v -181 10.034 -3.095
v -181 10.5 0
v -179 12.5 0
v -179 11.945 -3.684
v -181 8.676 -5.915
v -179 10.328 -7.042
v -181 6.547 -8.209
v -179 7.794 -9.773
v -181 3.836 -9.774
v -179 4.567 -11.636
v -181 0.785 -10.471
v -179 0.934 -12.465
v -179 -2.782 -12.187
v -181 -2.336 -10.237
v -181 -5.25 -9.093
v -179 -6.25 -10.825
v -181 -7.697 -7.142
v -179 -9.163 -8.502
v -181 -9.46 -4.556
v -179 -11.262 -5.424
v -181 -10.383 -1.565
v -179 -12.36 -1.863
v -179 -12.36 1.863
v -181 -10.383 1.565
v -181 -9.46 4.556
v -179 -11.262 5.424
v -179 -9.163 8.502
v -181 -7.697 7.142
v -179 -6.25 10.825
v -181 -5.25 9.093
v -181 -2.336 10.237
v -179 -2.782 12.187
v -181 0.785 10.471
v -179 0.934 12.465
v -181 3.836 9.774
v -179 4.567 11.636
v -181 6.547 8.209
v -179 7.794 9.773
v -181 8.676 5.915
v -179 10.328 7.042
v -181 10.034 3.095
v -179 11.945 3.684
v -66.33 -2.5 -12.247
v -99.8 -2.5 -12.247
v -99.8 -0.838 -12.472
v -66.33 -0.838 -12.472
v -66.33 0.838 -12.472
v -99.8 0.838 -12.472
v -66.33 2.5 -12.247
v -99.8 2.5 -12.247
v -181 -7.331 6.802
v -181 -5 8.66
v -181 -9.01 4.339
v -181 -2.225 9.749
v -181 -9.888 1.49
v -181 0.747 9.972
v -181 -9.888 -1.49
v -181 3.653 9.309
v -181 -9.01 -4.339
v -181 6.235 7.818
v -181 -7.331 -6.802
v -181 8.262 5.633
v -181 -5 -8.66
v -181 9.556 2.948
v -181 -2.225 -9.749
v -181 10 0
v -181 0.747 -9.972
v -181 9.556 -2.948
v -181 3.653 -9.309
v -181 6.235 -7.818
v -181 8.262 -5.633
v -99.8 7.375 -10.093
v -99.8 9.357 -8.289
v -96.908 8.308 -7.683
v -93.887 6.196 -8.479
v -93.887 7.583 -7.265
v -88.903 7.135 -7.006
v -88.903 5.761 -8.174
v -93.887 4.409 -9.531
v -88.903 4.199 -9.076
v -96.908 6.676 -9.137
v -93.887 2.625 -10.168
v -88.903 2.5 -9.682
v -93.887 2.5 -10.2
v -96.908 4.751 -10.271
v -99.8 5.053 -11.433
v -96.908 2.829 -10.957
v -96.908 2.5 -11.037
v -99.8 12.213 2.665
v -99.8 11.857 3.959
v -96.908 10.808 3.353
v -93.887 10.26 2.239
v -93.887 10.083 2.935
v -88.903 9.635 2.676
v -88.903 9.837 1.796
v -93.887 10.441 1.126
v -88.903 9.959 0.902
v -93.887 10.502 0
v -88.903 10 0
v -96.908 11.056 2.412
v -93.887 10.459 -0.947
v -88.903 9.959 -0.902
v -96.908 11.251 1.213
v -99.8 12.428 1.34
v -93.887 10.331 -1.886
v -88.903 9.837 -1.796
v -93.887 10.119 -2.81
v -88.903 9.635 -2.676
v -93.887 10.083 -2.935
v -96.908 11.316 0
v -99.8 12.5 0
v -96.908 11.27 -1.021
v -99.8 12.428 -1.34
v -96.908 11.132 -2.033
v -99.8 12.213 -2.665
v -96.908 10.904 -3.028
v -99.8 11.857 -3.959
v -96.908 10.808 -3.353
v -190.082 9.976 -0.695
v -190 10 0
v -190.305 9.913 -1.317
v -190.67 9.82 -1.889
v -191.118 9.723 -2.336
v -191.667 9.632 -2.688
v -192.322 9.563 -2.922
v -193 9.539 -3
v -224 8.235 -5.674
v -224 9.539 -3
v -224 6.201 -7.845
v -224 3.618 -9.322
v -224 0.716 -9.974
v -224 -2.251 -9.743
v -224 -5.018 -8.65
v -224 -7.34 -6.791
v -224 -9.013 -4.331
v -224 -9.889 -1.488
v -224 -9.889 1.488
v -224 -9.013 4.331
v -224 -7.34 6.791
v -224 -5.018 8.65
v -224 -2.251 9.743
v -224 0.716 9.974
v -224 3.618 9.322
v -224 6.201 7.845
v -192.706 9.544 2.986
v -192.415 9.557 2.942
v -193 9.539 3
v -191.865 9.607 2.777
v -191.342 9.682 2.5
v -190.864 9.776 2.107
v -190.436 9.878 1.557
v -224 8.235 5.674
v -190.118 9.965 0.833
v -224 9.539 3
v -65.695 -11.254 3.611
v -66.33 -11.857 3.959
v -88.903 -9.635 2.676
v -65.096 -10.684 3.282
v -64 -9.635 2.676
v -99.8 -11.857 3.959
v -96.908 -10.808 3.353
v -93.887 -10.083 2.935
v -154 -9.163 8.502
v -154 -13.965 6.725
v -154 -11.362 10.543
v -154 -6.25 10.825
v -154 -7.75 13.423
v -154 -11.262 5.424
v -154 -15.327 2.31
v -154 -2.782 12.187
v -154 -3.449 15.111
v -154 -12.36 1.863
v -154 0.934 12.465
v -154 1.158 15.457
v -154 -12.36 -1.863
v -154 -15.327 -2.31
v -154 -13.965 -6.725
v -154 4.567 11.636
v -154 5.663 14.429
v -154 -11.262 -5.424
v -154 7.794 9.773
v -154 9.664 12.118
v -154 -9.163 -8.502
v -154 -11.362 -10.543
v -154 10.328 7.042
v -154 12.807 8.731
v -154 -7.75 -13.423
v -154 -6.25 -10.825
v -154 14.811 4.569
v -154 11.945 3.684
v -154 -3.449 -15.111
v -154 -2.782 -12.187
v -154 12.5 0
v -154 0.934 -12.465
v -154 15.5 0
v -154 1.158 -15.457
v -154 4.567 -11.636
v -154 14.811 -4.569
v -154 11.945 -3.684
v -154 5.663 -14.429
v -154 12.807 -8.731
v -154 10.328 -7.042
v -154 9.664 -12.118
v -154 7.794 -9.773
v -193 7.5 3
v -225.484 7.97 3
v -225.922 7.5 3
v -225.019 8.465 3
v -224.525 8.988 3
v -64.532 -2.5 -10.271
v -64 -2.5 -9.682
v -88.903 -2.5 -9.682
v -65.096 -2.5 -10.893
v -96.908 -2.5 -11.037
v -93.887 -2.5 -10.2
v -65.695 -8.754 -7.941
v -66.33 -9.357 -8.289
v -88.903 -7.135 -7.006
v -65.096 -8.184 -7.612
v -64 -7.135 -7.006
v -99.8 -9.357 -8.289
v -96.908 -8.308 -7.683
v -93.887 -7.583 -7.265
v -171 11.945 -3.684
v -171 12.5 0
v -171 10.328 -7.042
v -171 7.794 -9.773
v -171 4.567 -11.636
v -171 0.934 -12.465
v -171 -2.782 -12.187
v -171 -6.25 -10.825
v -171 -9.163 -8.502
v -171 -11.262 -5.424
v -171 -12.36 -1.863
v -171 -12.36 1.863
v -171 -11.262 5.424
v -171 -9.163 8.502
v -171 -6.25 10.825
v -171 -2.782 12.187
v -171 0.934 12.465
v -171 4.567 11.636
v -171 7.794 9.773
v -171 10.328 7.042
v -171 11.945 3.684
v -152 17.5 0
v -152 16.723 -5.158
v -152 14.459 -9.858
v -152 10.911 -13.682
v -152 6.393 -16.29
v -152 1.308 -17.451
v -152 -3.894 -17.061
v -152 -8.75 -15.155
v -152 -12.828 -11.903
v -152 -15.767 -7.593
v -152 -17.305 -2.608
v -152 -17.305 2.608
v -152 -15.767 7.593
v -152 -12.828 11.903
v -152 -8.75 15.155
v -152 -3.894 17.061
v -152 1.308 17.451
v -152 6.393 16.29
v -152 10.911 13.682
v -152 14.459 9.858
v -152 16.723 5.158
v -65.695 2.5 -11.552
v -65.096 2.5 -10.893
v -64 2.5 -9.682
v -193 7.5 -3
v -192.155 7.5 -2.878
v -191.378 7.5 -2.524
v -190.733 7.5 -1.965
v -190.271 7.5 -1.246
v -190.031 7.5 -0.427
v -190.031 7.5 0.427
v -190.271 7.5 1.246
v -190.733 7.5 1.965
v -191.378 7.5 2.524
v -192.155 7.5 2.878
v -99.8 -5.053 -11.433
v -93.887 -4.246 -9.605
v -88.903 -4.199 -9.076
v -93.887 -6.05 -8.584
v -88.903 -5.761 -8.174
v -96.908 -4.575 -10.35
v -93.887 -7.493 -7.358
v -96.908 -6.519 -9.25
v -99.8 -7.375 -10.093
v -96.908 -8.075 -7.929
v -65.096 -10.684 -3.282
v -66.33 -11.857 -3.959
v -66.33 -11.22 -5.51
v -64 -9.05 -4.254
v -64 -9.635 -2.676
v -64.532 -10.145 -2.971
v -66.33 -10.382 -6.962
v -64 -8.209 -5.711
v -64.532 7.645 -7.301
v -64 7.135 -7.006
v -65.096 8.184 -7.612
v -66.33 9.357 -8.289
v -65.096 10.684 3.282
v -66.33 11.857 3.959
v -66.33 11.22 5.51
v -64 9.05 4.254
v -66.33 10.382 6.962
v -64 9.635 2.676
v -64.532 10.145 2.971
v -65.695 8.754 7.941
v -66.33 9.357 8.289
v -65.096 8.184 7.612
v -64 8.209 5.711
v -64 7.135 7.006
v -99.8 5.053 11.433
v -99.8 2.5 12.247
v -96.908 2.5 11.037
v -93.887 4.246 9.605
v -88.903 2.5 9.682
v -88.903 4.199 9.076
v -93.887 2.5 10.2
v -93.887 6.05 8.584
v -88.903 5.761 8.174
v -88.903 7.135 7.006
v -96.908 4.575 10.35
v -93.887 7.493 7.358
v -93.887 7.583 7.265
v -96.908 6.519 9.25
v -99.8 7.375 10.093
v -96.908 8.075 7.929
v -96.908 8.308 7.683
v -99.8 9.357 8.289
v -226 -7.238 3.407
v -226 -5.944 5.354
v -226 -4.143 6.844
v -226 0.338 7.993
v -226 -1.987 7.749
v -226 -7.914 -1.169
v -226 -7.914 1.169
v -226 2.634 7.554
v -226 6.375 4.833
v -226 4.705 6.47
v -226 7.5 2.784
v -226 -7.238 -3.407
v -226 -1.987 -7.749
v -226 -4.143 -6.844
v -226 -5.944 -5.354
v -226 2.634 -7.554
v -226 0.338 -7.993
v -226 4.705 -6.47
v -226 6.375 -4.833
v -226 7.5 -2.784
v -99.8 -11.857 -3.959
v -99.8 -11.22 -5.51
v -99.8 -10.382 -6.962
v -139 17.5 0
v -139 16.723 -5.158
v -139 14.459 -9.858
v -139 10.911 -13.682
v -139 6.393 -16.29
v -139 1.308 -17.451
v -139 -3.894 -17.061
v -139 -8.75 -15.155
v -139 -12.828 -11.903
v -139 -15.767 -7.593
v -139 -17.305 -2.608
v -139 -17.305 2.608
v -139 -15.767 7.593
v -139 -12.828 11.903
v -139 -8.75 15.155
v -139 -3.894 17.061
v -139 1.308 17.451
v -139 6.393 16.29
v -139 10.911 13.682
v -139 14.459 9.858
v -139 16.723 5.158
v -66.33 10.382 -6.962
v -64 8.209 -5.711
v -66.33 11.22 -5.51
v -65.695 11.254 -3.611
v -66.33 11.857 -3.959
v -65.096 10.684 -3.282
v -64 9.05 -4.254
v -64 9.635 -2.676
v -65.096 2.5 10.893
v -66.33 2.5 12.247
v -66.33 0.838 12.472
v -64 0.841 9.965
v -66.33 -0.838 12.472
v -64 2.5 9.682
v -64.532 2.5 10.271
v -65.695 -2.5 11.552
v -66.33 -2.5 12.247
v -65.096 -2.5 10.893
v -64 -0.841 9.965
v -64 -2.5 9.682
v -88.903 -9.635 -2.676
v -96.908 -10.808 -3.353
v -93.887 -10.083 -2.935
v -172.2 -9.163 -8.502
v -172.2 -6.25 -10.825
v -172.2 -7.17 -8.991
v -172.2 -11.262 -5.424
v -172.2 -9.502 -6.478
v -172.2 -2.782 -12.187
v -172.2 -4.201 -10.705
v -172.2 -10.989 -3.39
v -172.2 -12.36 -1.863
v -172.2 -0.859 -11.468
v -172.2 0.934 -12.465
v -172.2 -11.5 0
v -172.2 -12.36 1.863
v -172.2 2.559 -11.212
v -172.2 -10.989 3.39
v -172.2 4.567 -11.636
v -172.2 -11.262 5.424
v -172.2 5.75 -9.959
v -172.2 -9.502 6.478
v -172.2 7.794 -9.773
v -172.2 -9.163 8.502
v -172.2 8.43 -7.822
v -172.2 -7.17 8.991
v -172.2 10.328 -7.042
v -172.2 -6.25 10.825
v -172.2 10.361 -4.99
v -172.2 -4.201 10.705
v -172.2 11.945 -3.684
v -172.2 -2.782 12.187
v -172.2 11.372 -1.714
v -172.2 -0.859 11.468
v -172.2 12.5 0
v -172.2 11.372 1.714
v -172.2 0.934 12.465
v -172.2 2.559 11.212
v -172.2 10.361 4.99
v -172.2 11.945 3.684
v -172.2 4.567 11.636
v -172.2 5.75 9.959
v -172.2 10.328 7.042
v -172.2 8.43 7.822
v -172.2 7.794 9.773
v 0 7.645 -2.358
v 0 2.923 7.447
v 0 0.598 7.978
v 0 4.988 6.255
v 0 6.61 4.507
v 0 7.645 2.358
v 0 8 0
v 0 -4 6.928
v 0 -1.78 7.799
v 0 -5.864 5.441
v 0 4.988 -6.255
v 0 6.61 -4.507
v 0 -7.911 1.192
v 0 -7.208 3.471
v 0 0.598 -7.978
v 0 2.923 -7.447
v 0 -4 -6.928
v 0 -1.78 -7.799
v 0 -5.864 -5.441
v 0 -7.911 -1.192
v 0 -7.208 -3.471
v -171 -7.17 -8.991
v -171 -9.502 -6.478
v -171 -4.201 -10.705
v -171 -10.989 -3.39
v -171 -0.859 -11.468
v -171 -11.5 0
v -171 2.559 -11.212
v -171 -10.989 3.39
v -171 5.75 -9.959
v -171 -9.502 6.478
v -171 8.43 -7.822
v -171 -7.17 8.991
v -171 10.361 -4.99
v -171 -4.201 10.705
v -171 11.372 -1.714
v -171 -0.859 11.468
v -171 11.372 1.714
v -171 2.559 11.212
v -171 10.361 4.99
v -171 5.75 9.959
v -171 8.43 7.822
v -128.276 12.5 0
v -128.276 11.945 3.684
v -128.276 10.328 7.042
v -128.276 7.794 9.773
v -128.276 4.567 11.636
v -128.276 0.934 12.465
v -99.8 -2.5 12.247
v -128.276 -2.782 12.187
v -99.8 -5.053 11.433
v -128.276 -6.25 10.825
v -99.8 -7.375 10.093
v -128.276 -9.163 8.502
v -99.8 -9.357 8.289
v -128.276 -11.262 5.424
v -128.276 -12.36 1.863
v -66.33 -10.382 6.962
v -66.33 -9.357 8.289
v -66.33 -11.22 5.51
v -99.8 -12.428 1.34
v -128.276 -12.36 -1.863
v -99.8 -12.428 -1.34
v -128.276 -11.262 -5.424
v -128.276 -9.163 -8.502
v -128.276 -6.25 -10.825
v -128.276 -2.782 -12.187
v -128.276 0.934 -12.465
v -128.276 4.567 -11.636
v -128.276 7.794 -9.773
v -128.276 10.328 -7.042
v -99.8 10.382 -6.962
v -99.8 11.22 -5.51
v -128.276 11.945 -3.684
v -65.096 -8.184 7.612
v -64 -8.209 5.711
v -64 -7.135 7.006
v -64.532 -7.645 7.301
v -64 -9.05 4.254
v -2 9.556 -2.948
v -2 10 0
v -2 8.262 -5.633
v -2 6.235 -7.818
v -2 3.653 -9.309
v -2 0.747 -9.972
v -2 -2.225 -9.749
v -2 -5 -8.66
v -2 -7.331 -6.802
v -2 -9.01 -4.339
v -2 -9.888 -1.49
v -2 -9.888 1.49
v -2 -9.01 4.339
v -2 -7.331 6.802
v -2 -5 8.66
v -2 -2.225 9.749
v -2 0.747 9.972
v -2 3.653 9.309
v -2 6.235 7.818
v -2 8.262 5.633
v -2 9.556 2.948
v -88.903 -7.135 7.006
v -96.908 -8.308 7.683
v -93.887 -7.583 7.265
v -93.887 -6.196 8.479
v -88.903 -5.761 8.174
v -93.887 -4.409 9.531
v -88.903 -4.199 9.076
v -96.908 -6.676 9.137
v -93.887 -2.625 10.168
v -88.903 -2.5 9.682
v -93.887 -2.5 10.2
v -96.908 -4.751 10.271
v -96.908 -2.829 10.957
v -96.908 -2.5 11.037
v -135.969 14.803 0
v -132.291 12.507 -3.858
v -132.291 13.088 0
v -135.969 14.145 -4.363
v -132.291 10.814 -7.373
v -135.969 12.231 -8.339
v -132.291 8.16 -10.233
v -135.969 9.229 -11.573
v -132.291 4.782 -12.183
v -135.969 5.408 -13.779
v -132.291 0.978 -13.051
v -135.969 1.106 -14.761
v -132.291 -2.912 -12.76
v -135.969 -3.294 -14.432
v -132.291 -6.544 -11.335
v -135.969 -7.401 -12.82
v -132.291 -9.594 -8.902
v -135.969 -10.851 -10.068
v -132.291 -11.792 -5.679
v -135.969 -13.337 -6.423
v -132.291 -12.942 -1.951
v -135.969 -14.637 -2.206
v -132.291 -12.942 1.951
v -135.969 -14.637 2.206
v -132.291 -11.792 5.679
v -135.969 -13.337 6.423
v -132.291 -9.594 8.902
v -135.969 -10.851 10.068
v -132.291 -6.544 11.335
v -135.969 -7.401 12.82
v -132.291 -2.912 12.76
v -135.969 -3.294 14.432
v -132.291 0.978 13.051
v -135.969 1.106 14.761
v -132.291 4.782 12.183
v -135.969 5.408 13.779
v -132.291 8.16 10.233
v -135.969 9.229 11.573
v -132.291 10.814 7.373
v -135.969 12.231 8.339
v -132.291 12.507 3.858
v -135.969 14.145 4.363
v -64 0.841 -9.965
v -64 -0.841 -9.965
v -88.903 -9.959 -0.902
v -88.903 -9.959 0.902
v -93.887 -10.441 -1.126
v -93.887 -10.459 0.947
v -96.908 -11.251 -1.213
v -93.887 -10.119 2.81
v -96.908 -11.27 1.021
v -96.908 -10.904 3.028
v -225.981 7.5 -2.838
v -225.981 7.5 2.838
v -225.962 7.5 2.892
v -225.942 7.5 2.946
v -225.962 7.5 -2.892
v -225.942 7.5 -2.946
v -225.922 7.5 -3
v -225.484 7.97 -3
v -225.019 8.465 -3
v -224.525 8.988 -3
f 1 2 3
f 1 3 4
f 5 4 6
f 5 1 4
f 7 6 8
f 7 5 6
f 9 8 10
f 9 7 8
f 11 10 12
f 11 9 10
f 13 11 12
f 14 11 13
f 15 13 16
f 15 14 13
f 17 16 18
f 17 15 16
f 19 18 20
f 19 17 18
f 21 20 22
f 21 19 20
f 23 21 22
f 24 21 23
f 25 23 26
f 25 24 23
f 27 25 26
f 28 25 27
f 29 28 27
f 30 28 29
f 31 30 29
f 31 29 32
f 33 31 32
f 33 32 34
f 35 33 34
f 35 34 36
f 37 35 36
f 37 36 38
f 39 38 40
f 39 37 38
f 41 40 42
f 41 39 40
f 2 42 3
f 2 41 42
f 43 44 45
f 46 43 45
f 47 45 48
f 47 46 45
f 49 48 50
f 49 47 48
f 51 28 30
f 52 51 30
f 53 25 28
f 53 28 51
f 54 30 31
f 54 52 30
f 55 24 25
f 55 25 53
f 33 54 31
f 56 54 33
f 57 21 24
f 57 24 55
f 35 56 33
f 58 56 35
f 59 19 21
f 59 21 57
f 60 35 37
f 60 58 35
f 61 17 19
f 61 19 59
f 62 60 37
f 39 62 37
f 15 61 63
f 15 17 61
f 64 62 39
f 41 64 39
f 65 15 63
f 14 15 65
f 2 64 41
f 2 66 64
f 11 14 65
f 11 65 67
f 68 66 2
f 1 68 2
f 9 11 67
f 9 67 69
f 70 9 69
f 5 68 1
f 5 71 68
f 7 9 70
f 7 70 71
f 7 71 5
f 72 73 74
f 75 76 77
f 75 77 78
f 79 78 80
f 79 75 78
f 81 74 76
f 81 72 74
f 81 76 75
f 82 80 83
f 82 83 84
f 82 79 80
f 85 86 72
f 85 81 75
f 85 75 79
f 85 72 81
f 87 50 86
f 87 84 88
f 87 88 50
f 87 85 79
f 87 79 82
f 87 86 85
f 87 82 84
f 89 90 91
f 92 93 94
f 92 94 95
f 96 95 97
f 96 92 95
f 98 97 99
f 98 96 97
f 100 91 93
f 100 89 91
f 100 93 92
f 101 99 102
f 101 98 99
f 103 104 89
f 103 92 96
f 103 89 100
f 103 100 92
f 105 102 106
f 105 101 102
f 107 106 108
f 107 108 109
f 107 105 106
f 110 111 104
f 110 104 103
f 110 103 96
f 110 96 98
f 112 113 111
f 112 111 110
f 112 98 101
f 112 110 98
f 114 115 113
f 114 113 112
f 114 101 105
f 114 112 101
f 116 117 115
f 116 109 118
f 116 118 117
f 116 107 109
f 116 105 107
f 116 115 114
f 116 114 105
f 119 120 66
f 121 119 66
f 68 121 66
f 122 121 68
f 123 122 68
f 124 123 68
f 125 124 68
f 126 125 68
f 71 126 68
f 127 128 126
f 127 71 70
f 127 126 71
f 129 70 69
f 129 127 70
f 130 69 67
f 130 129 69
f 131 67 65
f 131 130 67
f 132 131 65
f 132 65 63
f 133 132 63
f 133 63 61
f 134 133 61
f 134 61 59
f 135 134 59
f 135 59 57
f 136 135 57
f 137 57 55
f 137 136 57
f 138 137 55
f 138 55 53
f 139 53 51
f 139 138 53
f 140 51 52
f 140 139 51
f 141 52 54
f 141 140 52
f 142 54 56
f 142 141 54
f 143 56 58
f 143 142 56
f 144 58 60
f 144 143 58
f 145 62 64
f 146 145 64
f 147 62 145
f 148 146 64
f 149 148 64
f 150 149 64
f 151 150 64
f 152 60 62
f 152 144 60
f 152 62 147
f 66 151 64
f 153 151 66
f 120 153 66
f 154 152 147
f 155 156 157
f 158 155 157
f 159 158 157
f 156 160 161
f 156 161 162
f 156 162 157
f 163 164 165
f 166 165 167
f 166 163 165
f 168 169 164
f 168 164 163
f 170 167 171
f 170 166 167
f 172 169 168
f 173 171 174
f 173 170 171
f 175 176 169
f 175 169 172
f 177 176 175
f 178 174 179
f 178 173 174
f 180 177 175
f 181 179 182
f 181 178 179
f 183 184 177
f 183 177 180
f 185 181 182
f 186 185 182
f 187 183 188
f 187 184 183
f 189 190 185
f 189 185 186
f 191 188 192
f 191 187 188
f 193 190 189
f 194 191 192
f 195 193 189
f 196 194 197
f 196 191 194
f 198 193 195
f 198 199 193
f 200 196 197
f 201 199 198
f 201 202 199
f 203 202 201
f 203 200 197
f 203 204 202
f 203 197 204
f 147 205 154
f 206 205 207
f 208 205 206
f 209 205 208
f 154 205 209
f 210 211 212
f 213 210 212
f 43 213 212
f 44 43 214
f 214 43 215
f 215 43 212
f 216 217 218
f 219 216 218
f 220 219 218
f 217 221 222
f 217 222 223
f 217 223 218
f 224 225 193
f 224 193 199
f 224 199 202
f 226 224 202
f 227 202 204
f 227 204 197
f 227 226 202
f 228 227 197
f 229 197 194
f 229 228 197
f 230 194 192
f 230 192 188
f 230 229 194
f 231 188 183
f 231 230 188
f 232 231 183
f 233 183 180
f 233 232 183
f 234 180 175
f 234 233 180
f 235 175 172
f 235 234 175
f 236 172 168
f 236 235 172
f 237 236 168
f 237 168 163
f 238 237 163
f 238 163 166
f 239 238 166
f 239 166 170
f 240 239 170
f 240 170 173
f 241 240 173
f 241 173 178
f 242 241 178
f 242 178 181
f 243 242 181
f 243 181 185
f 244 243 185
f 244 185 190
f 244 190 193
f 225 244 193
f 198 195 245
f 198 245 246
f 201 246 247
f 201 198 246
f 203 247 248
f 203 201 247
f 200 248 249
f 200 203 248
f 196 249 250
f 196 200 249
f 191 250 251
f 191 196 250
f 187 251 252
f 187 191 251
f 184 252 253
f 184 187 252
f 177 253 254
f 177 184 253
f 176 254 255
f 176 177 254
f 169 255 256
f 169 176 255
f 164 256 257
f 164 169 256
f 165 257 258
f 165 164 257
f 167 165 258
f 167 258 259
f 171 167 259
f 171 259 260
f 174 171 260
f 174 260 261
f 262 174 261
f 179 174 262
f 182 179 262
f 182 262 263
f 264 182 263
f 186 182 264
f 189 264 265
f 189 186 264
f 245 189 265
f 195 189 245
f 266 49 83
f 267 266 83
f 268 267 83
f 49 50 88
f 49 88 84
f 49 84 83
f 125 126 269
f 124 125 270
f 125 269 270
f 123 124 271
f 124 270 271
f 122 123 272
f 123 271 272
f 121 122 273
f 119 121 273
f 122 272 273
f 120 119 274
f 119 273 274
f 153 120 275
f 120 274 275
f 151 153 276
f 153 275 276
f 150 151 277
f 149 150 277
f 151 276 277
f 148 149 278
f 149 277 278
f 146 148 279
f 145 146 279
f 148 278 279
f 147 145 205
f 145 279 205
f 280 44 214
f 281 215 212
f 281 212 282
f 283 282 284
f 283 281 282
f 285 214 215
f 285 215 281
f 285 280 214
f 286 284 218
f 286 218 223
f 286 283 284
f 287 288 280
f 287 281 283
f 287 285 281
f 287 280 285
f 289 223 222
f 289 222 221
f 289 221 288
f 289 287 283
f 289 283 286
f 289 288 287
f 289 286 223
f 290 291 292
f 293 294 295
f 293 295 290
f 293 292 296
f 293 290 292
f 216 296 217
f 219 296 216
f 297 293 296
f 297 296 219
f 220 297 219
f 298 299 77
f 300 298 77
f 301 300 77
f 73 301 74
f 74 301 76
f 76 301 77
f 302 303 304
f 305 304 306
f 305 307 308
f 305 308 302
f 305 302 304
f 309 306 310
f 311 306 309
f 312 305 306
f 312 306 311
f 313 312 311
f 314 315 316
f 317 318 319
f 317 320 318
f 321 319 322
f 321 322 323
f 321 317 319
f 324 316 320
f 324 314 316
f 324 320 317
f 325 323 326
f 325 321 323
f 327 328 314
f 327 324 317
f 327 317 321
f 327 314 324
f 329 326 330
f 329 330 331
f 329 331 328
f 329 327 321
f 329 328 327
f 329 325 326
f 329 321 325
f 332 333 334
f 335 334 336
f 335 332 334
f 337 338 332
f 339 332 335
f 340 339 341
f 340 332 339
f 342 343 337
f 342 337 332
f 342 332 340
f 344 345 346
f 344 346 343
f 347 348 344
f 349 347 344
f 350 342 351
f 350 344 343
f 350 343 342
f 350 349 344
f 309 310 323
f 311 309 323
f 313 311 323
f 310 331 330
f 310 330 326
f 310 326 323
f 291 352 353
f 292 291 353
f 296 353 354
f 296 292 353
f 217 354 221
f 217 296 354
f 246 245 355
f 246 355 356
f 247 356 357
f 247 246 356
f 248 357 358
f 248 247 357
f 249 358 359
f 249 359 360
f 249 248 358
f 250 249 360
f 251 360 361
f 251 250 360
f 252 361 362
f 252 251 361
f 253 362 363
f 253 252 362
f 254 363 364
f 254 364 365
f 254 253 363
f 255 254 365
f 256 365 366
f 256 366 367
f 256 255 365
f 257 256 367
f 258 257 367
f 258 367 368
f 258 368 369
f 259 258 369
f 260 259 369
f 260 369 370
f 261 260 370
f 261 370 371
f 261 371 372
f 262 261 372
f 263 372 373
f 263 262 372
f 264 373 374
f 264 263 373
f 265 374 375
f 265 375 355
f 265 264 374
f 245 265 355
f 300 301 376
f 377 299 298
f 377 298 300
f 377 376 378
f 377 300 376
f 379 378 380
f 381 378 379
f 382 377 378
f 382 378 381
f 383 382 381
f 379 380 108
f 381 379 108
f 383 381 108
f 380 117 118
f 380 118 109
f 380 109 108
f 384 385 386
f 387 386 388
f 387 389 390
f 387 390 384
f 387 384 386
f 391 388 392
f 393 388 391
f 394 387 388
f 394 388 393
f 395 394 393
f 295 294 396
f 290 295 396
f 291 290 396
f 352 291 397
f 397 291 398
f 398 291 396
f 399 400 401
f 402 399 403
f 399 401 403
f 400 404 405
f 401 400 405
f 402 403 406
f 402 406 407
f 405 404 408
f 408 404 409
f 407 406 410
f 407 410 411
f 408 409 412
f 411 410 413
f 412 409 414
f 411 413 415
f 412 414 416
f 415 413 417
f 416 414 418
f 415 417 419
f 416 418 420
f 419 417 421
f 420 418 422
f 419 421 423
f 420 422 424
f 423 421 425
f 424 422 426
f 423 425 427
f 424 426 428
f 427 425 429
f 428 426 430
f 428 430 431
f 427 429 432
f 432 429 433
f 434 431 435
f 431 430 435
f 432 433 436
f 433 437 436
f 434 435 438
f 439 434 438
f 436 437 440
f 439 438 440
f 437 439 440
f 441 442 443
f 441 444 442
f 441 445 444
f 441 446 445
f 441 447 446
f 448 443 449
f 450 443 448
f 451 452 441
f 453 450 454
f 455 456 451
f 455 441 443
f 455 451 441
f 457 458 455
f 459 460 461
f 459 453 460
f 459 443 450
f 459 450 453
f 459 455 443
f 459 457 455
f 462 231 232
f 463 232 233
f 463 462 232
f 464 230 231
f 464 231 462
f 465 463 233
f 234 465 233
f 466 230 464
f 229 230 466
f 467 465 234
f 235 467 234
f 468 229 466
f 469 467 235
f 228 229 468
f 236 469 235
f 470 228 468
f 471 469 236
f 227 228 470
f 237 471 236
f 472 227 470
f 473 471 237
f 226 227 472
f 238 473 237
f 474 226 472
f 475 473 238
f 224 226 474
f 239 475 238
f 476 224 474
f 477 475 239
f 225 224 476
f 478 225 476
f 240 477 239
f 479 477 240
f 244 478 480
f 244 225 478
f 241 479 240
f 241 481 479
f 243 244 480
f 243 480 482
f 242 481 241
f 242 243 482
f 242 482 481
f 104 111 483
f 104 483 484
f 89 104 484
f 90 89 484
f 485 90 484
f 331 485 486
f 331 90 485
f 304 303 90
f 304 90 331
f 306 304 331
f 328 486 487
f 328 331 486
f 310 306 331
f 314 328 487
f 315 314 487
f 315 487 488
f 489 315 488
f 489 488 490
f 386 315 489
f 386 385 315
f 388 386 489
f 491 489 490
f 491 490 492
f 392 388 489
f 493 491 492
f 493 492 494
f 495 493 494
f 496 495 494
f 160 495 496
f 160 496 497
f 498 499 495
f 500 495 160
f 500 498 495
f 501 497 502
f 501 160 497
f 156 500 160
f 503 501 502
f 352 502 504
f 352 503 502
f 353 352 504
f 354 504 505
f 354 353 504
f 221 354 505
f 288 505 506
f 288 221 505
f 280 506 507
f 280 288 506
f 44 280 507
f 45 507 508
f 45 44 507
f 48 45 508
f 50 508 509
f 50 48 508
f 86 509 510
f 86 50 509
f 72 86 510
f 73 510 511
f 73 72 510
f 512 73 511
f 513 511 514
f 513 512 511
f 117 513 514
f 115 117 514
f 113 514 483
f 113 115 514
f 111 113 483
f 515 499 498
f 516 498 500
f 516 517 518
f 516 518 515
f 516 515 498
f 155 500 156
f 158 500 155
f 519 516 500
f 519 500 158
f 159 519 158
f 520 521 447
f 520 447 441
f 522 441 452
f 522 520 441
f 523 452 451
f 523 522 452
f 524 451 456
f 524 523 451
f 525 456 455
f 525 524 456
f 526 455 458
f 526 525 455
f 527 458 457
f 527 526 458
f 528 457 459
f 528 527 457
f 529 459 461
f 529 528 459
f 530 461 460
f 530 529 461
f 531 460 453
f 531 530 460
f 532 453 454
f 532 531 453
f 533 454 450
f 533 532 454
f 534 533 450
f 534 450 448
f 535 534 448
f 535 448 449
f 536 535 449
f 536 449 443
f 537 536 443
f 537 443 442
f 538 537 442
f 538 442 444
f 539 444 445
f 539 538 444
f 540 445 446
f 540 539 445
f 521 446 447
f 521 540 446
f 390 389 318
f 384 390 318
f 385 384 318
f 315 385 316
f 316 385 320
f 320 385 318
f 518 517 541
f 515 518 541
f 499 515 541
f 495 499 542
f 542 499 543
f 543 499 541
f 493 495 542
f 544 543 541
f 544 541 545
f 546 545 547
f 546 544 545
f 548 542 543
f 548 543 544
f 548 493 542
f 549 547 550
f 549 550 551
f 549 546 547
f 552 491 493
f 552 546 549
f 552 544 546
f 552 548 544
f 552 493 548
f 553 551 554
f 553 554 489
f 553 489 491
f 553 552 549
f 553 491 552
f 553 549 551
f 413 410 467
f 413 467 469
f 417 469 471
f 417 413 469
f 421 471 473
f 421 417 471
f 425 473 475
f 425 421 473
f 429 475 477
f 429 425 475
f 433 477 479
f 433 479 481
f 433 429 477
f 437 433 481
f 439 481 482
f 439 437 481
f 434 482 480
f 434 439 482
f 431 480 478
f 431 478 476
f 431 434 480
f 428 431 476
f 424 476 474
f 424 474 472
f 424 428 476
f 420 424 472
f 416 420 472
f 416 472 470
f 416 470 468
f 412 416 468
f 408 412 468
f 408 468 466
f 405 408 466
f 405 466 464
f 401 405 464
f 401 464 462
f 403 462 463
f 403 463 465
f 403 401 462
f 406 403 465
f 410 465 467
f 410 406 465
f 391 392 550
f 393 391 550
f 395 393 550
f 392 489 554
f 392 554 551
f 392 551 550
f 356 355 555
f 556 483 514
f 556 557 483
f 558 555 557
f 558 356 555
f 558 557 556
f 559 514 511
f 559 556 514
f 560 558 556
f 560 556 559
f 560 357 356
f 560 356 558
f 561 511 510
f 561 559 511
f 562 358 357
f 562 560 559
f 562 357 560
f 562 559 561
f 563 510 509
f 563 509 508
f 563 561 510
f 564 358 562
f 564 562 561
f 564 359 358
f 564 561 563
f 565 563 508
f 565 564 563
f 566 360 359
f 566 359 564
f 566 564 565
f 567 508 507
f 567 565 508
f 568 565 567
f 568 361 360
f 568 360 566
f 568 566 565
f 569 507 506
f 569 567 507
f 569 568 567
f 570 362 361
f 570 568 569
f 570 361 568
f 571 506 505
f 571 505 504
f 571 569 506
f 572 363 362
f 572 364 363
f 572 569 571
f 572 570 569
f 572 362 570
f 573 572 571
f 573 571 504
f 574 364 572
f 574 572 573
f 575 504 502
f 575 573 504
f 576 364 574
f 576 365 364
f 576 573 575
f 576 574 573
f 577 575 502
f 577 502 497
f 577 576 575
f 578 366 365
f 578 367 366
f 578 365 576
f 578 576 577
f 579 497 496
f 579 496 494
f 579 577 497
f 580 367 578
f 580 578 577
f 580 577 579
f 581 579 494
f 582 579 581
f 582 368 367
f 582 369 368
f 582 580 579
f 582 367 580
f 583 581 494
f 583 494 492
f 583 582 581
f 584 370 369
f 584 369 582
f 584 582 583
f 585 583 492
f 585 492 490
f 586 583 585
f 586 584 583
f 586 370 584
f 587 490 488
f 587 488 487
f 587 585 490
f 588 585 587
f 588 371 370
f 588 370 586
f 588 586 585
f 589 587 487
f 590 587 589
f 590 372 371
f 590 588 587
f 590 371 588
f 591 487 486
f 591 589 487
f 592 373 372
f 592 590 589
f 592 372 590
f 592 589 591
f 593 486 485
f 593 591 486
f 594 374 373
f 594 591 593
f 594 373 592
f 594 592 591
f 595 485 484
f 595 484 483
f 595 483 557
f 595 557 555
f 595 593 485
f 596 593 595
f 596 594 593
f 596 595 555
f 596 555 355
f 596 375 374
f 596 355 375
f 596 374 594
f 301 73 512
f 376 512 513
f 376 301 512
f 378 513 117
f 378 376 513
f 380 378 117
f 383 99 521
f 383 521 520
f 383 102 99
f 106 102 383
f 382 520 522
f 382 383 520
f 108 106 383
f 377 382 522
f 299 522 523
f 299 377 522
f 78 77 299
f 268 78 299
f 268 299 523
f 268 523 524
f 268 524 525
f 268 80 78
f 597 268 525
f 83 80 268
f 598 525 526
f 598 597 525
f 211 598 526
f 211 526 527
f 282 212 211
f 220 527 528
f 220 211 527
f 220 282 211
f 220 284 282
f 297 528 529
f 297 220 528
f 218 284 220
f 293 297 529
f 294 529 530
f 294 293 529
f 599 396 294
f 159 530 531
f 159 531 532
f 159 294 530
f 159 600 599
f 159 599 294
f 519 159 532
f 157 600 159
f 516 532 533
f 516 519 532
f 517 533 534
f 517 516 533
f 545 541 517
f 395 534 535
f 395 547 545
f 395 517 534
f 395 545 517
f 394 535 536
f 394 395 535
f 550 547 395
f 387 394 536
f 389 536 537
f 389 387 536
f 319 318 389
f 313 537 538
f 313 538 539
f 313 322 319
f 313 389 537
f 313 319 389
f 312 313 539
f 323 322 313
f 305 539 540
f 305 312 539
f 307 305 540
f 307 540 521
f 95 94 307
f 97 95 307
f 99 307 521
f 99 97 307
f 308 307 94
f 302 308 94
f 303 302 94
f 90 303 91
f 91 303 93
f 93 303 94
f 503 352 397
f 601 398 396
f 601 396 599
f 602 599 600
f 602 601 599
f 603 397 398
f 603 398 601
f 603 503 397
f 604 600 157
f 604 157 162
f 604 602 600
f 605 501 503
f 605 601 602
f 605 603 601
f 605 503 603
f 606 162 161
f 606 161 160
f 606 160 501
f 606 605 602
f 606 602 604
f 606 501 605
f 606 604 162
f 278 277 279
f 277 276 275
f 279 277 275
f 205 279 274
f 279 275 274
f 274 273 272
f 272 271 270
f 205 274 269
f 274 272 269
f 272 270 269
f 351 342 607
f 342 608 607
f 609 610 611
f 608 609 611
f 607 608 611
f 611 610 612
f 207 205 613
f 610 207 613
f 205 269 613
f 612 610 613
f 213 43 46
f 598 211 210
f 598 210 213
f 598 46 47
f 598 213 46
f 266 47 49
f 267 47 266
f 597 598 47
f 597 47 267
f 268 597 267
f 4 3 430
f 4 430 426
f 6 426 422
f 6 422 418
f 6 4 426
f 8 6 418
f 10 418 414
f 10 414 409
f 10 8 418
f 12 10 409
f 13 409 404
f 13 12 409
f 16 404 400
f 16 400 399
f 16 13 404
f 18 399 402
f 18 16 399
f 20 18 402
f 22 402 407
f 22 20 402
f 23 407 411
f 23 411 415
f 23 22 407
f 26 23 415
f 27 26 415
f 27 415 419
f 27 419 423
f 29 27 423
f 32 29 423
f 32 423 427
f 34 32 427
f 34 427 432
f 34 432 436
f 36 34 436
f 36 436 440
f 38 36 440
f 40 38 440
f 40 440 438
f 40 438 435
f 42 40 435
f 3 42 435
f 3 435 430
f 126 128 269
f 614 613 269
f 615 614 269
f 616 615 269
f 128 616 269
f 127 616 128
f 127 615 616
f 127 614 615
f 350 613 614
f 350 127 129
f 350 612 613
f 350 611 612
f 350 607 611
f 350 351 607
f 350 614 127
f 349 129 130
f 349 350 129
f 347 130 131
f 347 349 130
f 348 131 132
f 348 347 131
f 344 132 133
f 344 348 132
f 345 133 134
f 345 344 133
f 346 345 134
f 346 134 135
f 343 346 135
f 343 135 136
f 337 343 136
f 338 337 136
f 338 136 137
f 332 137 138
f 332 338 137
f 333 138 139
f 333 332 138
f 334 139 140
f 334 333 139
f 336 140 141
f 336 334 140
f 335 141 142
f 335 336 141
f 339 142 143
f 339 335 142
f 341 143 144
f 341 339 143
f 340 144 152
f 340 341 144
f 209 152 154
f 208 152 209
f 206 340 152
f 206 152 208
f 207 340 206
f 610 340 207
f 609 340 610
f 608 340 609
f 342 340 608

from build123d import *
from build123d.topology import SkipClean

# Parameters (mm, degrees)
EXTRUDE_START            = 27
SKETCH_2_R               = 12.5
EXTRUDE_1_DEPTH          = 27
EXTRUDE_START_2          = 45
SKETCH_3_R               = 10
EXTRUDE_2_DEPTH          = 45
CUT_EXTRUDE_START        = -8.8
SKETCH_5_OUTSIDE_W       = 83.272
SKETCH_5_OUTSIDE_H       = 83.272
SKETCH_5_OUTSIDE_R       = 11.5
CUT_EXTRUDE_1_DEPTH      = 1.2
CUT_EXTRUDE_START_2      = 7.5
CUT_EXTRUDE_2_DEPTH      = 220.851050141
EXTRUDE_3_REACH          = 293.351
EXTRUDE_START_3          = -64
PATTERN_CIRCULAR_1_COUNT = 6
CHAMFER_1_SIZE           = 2


with BuildPart() as part:
    # 草图1 → 旋转1 (revolve)
    with BuildSketch(Plane.XY):
        with BuildLine():
            Line((0, 0), (0, 10))
            Line((0, 10), (-88.902752641, 10))
            ThreePointArc((-88.902752641, 10), (-94.492922585, 10.633014138), (-99.8, 12.5))
            Line((-99.8, 12.5), (-128.276194705, 12.5))
            ThreePointArc((-128.276194705, 12.5), (-134.192274488, 13.81142246), (-139, 17.5))
            Line((-139, 17.5), (-154, 17.5))
            Line((-154, 17.5), (-154, 0))
            Line((-154, 0), (0, 0))
        make_face()
    revolve(axis=Axis((0, 0, 0), (-1, 0, 0)))

    # 草图2 → 凸台-拉伸1 (add)
    with BuildSketch(Plane.ZY.offset(154).offset(EXTRUDE_START)):
        with Locations(Location((0, 0, 0), (0, 0, 90))):
            Circle(SKETCH_2_R)
    extrude(amount=-EXTRUDE_1_DEPTH)

    # 草图3 → 凸台-拉伸2 (add)
    with BuildSketch(Plane.ZY.offset(181).offset(EXTRUDE_START_2)):
        with Locations(Location((0, 0, 0), (0, 0, 90))):
            Circle(SKETCH_3_R)
    extrude(amount=-EXTRUDE_2_DEPTH)

    # 草图5 outside → 切除-拉伸1 (cut)
    with BuildSketch(Plane.ZY.offset(181).offset(CUT_EXTRUDE_START)):
        Rectangle(SKETCH_5_OUTSIDE_W, SKETCH_5_OUTSIDE_H)
        with Locations(Location((0, 0, 0), (0, 0, 270))):
            Circle(SKETCH_5_OUTSIDE_R, mode=Mode.SUBTRACT)
    extrude(amount=-CUT_EXTRUDE_1_DEPTH, mode=Mode.SUBTRACT)

    # 草图7 → 切除-拉伸2 (cut, through all)
    with BuildSketch(Plane(origin=(0, 0, 0), x_dir=(1, 0, 0), z_dir=(0, 1, 0)).offset(CUT_EXTRUDE_START_2)):
        with BuildLine():
            Line((-226, 3), (-193, 3))
            ThreePointArc((-193, 3), (-190, 0), (-193, -3))
            Line((-193, -3), (-226, -3))
            ThreePointArc((-226, -3), (-229, 0), (-226, 3))
        make_face()
    extrude(amount=CUT_EXTRUDE_2_DEPTH, mode=Mode.SUBTRACT)

    # 草图8 → 凸台-拉伸3 (add, up to next)
    with BuildSketch(Plane(origin=(0, 0, 0), x_dir=(0, 0, -1), z_dir=(1, 0, 0)).offset(EXTRUDE_START_3), mode=Mode.PRIVATE) as extrude_3_sk1:
        with BuildLine():
            Line((12.247448714, 2.5), (9.682458366, 2.5))
            ThreePointArc((9.682458366, 2.5), (10, 0), (9.682458366, -2.5))
            Line((9.682458366, -2.5), (12.247448714, -2.5))
            ThreePointArc((12.247448714, -2.5), (12.5, 0), (12.247448714, 2.5))
        make_face()
    extrude_3_tool1 = extrude(extrude_3_sk1.sketch, amount=-EXTRUDE_3_REACH, mode=Mode.PRIVATE) - part.part
    extrude_3 = extrude_3_tool1.solids().sort_by_distance((-64, 0, -11.154849))[0]
    add(extrude_3)

    # 阵列(圆周)1: 凸台-拉伸3 ×6 about axis
    with SkipClean():  # the faces are left unmerged after this step: merging them gives an invalid solid
        pattern_circular_1_axis = Axis((0, 0, 0), (1, 0, 0))
        for i in range(1, PATTERN_CIRCULAR_1_COUNT):
            add(extrude_3.rotate(pattern_circular_1_axis, i * 360 / PATTERN_CIRCULAR_1_COUNT))

    # 草图9 → 切除-旋转1 (revolve, cut)
    with BuildSketch(Plane(origin=(0, 0, 0), x_dir=(1, 0, 0), z_dir=(0, 1, 0)), mode=Mode.PRIVATE) as cut_revolve_1_sk:
        Polygon((-64, 10), (-64, 12.5), (-66.329579642, 12.5), align=None)
    revolve(cut_revolve_1_sk.sketch.rotate(Axis((0, 0, 0), (1, 0, 0)), 270), axis=Axis((0, 0, 0), (1, 0, 0)), mode=Mode.SUBTRACT)

    # 倒角1
    chamfer_1_edges = [part.edges().sort_by_distance(p)[0] for p in [
        (-226, -10, 0),
        (-181, -12.5, 0),
        (-154, -17.5, 0),
        (0, -10, 0),
    ]]
    chamfer(chamfer_1_edges, length=CHAMFER_1_SIZE)


solid = part.part
